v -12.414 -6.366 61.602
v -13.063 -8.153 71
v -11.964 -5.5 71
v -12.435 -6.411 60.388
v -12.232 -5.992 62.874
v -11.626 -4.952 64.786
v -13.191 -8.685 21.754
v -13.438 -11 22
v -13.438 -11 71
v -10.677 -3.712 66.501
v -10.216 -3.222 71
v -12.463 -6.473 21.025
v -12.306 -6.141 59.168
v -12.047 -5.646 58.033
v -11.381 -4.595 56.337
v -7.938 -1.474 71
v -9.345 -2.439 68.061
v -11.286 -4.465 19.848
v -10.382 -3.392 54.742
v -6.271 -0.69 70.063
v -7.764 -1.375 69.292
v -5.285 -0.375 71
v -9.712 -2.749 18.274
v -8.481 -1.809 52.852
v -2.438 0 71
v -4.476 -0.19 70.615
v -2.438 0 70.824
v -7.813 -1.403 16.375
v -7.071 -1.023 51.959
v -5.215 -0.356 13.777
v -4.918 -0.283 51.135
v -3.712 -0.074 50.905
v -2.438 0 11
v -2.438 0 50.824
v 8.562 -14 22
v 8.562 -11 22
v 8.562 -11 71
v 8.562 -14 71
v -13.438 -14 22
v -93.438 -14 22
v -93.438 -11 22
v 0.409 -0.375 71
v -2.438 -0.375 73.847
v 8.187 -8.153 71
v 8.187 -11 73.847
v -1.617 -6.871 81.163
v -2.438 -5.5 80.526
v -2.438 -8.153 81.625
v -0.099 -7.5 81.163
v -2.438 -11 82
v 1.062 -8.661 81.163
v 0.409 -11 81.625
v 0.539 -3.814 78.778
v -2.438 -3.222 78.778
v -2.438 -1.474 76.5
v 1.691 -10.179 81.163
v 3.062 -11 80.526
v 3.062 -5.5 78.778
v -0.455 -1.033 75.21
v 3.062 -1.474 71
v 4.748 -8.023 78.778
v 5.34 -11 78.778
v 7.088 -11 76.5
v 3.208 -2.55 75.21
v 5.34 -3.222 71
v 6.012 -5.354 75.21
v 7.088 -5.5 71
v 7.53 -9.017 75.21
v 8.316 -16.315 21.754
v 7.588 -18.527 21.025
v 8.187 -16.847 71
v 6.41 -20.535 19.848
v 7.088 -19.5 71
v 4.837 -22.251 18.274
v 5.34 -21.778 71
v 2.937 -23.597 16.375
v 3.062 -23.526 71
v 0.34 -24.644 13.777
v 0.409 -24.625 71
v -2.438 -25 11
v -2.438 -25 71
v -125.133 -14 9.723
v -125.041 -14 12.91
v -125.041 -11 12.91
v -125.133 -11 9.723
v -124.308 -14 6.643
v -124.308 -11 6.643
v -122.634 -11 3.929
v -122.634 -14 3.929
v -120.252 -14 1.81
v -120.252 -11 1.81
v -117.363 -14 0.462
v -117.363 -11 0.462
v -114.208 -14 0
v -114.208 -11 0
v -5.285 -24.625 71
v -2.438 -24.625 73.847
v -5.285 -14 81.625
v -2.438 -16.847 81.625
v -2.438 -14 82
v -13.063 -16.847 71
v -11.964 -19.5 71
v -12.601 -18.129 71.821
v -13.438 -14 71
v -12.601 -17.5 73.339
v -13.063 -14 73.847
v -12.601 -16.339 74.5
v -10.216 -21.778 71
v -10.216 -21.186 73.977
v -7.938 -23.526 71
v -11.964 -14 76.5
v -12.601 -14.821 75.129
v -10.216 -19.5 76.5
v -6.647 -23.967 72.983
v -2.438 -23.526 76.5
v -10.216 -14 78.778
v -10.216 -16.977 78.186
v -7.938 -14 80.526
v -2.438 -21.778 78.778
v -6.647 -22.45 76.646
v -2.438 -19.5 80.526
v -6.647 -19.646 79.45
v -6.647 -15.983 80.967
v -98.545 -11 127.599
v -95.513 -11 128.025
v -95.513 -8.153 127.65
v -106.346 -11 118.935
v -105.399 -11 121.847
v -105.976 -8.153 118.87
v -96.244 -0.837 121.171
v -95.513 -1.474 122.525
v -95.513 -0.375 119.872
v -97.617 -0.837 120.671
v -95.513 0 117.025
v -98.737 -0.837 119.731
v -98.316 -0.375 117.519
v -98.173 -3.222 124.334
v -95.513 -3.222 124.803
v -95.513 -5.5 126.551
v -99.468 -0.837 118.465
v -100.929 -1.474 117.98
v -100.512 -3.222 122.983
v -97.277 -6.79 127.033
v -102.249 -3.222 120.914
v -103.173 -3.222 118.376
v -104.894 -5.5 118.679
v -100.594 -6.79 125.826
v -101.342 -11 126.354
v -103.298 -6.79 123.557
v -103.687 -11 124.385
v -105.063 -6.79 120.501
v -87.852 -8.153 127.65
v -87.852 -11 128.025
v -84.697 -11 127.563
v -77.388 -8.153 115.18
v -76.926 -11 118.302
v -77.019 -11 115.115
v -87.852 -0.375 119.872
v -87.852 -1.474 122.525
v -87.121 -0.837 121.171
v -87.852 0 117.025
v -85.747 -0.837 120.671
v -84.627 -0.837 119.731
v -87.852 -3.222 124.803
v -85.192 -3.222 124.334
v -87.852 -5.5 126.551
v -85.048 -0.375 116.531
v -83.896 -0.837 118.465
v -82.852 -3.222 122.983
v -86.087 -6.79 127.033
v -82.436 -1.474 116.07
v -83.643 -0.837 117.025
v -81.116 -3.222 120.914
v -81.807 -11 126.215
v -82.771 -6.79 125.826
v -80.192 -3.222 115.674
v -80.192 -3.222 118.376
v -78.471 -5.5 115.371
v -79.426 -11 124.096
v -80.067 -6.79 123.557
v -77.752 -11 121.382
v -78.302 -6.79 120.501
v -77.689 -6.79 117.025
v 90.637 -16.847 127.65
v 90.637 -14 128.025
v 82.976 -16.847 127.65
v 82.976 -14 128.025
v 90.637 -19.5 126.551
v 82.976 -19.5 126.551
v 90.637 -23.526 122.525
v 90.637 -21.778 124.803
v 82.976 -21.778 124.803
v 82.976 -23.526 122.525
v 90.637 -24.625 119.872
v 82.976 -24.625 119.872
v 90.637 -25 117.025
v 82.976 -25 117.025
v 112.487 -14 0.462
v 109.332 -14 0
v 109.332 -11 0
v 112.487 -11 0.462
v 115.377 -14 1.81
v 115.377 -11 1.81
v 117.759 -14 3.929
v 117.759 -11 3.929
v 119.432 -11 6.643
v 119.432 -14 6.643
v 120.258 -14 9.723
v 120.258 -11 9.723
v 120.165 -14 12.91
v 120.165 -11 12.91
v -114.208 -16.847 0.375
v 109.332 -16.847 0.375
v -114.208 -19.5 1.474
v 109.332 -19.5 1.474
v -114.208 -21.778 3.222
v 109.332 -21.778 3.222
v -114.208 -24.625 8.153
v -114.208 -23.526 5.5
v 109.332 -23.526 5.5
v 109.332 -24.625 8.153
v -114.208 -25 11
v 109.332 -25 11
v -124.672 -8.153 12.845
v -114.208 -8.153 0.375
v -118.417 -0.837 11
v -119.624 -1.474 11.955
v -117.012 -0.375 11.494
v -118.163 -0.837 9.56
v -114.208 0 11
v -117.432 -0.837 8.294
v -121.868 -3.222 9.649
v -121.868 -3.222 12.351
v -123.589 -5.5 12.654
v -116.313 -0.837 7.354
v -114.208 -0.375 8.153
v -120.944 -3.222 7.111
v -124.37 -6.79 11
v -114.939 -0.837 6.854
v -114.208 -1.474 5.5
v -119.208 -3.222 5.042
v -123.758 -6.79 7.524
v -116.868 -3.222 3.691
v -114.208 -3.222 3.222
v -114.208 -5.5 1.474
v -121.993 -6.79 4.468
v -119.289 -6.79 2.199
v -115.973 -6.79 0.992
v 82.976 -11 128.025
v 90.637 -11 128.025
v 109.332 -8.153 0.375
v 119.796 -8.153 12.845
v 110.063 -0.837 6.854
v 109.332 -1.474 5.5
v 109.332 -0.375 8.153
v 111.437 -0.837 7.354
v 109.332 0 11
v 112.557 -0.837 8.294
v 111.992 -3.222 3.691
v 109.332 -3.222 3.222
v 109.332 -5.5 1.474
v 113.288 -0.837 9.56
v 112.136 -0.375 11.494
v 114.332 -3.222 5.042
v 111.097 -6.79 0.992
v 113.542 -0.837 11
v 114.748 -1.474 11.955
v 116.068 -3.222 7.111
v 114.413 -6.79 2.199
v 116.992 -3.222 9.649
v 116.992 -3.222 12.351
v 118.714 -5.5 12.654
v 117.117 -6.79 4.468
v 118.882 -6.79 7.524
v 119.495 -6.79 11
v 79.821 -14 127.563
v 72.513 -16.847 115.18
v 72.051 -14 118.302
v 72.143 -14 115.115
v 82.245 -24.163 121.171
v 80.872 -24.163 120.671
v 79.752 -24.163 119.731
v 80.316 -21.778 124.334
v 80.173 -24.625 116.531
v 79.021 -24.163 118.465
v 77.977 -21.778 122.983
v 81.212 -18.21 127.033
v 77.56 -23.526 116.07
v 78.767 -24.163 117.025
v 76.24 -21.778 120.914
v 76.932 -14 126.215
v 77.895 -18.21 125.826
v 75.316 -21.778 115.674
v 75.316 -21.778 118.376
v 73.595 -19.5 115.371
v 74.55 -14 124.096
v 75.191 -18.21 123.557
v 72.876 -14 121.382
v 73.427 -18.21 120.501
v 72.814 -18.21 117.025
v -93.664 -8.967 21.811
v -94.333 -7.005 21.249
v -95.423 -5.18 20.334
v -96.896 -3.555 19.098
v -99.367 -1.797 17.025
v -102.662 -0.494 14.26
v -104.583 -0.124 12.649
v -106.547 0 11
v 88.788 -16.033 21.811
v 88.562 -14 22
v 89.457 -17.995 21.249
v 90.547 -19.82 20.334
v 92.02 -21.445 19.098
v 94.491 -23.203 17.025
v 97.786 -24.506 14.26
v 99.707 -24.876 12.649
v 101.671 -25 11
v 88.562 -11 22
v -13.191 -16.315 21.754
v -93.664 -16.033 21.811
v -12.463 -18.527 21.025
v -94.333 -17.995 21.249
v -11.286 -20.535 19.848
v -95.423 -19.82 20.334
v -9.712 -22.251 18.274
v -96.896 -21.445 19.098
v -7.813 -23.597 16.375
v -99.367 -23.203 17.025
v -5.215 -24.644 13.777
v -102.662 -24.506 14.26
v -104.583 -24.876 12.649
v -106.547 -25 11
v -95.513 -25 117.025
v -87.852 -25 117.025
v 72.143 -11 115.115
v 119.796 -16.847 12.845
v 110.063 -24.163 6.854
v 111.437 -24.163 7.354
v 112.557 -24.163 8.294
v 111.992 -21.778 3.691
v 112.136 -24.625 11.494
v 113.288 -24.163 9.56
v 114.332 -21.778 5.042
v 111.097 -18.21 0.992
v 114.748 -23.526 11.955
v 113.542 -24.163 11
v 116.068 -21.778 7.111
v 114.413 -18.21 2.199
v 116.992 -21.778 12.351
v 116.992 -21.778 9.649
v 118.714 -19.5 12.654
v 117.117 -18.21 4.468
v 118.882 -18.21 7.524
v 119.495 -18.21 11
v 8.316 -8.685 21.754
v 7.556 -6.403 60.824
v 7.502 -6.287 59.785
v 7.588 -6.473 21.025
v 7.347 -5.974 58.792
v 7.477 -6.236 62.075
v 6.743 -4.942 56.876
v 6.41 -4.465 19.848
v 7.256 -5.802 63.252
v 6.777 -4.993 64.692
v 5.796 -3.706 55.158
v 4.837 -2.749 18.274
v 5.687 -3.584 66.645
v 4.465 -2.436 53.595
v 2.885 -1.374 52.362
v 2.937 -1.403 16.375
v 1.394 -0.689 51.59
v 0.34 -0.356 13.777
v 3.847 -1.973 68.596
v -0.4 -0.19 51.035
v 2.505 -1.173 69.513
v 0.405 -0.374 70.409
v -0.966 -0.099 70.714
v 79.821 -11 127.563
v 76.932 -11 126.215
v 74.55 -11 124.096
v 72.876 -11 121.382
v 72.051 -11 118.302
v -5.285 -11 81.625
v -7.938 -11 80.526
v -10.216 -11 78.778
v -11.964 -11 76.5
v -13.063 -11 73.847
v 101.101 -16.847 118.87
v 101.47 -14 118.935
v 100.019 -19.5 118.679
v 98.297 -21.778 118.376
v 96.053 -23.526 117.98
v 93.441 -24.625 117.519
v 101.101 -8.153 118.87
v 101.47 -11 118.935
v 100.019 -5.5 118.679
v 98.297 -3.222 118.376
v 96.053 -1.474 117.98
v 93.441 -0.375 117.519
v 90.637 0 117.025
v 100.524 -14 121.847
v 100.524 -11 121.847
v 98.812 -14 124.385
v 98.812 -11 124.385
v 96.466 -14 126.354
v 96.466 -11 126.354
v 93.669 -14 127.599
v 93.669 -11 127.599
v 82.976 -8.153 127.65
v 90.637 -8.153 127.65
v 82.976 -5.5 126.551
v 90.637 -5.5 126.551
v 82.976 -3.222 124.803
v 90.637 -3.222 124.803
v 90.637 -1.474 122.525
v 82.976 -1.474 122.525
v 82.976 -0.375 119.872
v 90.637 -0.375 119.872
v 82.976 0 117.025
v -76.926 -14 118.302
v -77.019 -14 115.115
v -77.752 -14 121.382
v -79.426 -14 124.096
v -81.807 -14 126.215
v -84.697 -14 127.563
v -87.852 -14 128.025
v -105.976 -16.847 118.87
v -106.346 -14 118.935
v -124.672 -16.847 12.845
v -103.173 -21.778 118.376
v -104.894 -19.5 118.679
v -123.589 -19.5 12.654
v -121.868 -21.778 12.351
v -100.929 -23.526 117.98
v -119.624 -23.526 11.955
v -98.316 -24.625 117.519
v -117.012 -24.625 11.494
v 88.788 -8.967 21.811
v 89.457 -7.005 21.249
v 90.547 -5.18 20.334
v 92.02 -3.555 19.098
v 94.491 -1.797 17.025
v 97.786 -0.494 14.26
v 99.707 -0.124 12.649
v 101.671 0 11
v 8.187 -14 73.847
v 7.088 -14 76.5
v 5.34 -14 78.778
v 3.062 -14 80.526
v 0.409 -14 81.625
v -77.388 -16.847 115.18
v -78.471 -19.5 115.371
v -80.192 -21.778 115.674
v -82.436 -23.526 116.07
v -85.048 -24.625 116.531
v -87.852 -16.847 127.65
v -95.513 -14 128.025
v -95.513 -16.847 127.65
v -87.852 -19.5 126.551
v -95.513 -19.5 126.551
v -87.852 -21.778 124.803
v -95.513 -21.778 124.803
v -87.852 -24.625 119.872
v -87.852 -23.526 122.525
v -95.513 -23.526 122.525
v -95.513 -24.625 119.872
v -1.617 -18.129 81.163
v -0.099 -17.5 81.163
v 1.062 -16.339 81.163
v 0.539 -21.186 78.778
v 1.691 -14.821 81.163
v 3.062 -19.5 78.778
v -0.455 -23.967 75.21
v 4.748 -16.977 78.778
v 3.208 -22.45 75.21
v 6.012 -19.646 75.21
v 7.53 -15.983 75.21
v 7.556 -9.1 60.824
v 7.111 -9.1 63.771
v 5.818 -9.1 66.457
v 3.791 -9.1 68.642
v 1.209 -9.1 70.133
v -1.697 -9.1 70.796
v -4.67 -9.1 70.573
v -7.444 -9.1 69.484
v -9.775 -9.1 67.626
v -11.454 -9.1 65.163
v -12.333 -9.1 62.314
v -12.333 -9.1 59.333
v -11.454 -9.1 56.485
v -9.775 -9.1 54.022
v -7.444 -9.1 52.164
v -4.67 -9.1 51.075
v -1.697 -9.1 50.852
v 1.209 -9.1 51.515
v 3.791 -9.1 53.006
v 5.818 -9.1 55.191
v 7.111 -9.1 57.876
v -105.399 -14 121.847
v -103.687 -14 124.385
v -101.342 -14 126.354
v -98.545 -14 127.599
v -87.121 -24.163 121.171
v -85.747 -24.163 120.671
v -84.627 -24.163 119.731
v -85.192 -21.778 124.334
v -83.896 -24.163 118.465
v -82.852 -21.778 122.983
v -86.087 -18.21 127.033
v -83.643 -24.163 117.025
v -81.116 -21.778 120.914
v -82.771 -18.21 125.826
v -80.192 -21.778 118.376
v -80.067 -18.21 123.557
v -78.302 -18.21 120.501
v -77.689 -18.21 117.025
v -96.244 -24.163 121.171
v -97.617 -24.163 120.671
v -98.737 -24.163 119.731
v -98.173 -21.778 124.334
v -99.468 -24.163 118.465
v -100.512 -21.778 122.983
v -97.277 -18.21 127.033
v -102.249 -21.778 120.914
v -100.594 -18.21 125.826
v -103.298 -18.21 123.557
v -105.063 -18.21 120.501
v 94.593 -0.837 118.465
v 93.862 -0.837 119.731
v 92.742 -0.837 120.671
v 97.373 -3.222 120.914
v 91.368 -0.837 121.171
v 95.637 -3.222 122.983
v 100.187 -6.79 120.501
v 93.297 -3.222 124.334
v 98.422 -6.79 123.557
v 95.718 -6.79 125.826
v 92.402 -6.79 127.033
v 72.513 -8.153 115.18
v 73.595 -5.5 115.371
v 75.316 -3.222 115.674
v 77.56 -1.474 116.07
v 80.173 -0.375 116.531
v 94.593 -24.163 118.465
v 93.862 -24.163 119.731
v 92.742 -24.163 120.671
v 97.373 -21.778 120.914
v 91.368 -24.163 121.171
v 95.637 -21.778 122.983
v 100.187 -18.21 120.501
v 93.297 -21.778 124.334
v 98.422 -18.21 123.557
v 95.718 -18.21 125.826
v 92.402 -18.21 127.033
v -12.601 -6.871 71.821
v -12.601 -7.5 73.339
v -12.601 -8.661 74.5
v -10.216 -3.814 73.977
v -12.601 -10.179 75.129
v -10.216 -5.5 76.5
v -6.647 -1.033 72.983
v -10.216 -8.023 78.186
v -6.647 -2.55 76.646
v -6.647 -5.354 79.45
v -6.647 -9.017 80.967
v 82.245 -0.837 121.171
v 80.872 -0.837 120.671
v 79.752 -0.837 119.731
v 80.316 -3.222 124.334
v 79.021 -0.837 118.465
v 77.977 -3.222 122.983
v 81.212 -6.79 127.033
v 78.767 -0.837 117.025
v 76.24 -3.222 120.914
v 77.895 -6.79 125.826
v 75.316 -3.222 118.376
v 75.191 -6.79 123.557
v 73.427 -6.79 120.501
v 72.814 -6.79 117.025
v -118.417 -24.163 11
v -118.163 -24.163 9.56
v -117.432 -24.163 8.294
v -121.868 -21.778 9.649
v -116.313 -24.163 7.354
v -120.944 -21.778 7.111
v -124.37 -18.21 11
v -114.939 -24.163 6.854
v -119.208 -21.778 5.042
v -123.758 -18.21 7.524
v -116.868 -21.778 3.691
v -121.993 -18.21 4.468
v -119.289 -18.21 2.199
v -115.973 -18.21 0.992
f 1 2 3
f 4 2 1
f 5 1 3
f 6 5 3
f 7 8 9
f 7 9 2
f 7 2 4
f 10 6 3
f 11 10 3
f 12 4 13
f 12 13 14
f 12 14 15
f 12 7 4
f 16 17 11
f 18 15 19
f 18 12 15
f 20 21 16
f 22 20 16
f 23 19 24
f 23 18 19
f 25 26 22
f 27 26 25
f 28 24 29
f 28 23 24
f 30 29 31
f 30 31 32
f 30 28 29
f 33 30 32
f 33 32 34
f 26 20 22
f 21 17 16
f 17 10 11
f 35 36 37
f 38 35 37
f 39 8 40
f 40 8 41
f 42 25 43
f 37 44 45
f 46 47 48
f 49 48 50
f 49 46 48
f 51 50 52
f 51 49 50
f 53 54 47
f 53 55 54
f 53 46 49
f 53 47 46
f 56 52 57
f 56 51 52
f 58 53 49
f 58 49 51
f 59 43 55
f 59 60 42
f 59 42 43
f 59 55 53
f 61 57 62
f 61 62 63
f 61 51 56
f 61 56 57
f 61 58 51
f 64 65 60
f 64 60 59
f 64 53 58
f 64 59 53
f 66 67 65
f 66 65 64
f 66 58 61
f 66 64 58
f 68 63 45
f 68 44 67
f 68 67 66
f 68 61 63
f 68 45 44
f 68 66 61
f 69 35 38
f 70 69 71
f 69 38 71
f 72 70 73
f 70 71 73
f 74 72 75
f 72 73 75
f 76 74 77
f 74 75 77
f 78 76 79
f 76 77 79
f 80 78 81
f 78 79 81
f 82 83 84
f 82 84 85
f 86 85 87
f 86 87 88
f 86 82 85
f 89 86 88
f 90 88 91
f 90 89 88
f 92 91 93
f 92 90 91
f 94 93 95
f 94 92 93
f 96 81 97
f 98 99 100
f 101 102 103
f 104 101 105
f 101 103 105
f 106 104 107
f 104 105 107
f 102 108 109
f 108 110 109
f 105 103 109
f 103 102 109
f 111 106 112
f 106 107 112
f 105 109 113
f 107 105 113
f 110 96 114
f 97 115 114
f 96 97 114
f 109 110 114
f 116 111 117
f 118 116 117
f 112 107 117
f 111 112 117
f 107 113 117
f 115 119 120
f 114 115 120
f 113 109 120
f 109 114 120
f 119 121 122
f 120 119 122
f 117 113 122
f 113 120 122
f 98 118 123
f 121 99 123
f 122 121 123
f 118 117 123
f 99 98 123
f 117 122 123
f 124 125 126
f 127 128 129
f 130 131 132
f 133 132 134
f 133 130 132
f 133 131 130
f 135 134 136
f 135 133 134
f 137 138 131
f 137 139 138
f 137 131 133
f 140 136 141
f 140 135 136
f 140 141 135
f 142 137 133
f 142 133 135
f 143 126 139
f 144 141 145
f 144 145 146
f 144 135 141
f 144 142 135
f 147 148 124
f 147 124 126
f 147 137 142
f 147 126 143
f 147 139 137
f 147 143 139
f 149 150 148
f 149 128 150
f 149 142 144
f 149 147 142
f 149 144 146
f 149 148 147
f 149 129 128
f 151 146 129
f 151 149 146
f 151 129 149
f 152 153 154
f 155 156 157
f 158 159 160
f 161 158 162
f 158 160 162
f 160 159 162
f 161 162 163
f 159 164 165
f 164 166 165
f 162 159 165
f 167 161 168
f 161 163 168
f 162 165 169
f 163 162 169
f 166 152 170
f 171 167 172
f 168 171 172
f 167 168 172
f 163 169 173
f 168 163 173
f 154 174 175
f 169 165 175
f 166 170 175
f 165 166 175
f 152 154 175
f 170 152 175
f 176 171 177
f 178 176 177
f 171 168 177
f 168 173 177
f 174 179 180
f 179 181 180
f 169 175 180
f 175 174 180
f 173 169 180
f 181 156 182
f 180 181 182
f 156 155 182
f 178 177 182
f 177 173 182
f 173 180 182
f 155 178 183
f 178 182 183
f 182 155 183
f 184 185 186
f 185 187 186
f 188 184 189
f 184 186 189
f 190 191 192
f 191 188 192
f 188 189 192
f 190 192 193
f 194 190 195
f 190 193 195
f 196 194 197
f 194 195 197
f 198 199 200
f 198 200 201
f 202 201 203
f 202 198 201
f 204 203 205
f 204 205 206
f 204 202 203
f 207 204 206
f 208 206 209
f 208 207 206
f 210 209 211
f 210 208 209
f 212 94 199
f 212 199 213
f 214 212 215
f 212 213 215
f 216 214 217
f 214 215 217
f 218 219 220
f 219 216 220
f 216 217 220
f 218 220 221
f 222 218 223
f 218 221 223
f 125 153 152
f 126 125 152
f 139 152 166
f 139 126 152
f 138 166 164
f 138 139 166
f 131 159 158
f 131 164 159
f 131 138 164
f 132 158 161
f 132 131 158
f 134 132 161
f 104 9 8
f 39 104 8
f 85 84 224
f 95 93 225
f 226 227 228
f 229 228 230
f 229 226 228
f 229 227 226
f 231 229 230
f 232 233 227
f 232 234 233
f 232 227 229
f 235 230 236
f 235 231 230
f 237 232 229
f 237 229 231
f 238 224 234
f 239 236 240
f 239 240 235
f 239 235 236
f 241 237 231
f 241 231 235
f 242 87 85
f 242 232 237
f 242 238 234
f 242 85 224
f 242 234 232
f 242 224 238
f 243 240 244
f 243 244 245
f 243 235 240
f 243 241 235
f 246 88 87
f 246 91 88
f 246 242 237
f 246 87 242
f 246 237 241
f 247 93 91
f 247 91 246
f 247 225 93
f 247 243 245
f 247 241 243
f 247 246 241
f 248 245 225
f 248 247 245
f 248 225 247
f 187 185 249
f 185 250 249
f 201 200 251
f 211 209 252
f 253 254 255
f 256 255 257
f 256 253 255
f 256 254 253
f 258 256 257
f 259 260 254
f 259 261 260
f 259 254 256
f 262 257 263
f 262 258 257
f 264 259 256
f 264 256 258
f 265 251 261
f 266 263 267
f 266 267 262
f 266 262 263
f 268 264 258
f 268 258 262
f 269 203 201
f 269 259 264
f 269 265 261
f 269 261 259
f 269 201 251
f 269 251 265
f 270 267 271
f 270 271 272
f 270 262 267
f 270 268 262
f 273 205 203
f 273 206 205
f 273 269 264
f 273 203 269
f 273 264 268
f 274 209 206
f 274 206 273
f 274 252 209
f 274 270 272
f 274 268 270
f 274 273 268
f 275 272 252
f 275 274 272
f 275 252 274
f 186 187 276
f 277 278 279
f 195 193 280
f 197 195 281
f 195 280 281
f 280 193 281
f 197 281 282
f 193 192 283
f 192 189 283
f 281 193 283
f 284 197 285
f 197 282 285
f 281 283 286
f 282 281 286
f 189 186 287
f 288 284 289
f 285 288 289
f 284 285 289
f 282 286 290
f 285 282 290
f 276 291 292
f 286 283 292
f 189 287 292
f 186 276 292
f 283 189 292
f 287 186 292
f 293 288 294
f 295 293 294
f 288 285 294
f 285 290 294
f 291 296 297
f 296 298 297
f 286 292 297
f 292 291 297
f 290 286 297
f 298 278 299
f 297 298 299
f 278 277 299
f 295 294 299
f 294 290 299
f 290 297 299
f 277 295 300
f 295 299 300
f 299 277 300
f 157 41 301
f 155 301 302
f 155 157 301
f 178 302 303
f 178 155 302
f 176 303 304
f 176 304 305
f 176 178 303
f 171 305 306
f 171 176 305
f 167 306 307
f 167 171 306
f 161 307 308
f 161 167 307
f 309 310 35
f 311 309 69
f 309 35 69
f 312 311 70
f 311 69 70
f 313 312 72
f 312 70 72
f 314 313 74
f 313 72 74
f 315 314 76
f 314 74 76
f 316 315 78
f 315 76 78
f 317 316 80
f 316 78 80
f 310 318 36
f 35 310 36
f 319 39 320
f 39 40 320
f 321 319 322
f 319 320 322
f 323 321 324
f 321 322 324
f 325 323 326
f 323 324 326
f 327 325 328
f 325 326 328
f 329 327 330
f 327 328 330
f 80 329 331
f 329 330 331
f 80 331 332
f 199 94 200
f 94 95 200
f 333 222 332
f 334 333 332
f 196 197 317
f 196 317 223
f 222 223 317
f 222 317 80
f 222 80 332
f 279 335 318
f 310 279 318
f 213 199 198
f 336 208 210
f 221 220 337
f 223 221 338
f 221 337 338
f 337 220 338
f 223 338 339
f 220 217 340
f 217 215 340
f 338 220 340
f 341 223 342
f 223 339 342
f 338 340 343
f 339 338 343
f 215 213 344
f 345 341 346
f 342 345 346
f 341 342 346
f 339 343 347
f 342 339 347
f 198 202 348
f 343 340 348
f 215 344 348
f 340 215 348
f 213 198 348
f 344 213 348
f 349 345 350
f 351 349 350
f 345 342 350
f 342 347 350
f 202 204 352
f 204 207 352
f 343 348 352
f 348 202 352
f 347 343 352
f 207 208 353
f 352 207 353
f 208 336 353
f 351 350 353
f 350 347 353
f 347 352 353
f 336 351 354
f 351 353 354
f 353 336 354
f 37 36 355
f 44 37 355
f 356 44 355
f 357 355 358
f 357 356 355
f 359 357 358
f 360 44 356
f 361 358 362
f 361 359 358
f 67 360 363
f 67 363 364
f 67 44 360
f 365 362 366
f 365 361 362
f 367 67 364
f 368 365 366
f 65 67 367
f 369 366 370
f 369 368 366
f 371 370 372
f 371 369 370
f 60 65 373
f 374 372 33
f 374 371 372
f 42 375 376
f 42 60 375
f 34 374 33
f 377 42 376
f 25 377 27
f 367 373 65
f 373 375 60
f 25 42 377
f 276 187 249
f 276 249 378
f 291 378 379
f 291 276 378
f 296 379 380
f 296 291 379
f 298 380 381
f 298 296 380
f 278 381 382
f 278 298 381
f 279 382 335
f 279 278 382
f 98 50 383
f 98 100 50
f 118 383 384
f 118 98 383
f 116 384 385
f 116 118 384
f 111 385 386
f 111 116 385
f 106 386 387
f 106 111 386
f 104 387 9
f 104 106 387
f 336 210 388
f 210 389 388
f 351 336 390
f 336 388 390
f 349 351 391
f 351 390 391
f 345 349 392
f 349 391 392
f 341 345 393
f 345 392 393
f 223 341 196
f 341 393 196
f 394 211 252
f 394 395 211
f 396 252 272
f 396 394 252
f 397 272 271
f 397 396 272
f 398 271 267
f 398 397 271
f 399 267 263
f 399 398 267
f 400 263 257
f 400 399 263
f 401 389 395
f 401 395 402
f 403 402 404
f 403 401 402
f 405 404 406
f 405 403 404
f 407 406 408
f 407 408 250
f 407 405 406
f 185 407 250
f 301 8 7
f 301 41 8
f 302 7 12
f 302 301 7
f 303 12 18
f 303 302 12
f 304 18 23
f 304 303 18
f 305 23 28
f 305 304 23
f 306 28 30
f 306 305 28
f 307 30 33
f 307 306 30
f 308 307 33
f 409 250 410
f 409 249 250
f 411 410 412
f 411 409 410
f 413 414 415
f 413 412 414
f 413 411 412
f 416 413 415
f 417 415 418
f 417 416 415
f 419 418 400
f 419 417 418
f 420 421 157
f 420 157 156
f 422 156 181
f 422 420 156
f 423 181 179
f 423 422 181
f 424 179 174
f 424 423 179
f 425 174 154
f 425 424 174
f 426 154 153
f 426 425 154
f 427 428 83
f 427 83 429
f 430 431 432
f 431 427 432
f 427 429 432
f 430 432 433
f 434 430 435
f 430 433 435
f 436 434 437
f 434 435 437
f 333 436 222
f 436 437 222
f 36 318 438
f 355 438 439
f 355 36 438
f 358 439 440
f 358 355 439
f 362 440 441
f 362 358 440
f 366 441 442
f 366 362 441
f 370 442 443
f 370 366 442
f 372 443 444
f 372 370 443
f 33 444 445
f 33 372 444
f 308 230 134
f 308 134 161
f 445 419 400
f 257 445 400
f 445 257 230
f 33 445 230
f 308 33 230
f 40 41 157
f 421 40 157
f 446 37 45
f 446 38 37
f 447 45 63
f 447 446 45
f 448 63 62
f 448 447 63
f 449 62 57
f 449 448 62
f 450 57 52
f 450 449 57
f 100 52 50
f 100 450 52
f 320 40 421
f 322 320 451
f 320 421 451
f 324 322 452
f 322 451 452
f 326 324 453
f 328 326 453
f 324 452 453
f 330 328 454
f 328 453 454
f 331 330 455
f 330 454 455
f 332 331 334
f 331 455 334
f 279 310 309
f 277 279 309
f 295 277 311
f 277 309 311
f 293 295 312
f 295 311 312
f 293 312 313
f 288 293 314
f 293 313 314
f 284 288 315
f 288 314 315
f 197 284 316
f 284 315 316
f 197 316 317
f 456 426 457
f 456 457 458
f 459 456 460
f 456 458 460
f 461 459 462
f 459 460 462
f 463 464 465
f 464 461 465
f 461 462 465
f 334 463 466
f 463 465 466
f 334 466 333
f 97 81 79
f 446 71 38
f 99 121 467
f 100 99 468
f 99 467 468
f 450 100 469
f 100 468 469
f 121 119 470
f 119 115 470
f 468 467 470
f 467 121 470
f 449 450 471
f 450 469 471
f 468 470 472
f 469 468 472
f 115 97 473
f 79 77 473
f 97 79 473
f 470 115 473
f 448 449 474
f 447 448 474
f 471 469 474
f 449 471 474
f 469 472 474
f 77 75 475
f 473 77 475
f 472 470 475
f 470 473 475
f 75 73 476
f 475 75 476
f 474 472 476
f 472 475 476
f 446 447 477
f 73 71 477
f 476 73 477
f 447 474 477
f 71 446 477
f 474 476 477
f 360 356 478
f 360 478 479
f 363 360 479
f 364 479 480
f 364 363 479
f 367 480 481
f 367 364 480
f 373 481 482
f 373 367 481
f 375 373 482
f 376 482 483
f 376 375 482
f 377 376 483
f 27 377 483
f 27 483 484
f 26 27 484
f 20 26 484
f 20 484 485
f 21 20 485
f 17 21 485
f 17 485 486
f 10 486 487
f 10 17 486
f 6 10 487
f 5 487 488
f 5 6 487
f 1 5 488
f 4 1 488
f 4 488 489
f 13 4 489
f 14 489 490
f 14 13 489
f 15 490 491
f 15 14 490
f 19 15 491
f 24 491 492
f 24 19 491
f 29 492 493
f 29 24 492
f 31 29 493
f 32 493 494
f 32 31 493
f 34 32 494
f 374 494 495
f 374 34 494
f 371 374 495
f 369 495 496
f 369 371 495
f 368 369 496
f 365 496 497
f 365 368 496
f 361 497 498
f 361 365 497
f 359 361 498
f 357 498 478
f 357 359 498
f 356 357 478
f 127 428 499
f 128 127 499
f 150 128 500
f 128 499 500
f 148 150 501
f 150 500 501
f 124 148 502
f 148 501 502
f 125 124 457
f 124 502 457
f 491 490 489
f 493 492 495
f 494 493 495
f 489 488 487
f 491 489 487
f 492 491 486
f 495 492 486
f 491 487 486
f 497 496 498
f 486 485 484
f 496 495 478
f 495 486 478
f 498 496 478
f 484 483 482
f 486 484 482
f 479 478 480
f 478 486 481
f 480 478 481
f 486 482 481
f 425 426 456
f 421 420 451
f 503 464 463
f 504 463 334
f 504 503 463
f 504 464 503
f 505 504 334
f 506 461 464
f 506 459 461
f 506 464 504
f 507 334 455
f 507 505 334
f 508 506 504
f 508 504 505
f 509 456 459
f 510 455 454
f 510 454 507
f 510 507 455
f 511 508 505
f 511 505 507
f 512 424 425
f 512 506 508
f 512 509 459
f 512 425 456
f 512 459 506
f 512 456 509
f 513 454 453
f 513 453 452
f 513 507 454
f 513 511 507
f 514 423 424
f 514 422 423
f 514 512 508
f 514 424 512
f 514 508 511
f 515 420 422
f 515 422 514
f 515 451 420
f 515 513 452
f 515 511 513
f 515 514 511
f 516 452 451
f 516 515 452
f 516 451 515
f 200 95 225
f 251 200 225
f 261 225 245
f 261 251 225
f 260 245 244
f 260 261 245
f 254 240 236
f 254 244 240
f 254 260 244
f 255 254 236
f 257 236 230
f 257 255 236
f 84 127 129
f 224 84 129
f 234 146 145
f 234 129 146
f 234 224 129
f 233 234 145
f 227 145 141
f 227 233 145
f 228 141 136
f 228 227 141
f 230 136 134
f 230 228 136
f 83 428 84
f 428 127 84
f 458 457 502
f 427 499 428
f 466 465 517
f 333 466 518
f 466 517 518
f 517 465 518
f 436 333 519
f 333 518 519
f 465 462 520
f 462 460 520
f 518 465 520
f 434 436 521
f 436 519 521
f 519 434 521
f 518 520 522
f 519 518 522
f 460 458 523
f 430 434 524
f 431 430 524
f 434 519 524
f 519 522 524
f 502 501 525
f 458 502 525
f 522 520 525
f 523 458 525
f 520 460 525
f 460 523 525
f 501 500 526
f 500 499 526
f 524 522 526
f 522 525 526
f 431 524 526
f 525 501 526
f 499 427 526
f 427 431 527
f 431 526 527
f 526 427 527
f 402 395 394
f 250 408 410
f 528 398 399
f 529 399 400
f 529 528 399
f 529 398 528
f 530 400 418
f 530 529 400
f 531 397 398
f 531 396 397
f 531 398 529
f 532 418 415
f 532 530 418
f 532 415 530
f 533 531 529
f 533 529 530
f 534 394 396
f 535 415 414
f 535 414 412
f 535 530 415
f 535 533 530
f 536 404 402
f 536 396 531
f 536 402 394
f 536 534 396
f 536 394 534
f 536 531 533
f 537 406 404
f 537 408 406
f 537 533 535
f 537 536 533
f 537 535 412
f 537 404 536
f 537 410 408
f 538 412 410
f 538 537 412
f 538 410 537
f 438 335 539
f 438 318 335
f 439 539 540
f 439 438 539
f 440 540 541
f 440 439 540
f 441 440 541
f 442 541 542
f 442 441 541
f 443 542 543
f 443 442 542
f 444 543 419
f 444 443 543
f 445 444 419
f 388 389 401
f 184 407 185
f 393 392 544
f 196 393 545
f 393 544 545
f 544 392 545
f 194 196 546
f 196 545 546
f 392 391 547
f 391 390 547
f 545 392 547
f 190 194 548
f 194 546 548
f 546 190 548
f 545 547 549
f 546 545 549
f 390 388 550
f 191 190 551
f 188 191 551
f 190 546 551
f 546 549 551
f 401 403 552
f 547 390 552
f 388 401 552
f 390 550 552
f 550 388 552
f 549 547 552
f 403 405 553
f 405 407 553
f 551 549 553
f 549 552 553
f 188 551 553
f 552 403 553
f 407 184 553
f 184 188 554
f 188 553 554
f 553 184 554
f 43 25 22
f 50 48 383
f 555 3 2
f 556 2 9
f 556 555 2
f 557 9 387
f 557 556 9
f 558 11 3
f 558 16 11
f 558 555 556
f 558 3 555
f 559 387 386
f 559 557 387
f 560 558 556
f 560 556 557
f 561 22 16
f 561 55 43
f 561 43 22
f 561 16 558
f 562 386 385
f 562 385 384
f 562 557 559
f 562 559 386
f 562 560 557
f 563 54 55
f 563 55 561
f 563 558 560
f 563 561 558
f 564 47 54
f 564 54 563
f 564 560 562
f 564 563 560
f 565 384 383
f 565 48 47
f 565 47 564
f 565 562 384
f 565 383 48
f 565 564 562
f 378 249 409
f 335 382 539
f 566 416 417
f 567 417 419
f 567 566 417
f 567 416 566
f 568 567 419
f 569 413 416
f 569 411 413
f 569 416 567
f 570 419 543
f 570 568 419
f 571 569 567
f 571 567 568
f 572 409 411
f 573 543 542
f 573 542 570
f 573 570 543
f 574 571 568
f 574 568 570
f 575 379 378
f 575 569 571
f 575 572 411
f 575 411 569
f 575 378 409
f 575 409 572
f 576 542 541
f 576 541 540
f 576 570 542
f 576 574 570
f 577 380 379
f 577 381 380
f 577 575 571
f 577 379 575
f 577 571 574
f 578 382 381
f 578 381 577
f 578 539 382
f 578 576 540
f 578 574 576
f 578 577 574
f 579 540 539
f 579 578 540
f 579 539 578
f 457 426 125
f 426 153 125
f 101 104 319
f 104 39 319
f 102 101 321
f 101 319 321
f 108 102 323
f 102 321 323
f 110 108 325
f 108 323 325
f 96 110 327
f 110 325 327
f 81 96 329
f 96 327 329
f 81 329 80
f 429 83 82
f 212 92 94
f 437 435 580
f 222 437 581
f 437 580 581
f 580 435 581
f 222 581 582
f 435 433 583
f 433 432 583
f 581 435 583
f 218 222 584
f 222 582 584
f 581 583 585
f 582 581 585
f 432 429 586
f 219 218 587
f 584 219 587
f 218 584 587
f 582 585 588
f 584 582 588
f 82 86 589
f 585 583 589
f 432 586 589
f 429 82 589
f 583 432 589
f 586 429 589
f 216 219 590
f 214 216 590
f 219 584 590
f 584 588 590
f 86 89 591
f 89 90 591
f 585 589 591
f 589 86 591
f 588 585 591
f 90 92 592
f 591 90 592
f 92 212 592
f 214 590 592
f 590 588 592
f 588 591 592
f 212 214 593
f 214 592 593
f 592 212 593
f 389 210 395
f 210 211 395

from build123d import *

# Parameters (mm, degrees)
F1_DEPTH = 25
F2_R     = 10.99999
F3_R     = 10
F4_DEPTH = 9.1


# Not quite as in the source:
# - a fillet or chamfer is up to 0.001 mm smaller than in the source, because OpenCascade refuses the exact size


with BuildPart() as f1:
    # F0 (on Front) → F1 (new body)
    with BuildSketch(Plane.XZ):
        Polygon((-104.7428149239, 128.0250078916), (-127.3170780206, 0), (122.4413091306, 0), (99.8670460339, 128.0250078916), (92.5590772594, 128.0250078916), (69.8670460339, 128.0250078916), (88.562115555, 22), (8.562115555, 22), (8.562115555, 82), (-13.437884445, 82), (-13.437884445, 22), (-93.437884445, 22), (-74.7428149239, 128.0250078916), (-93.565618156, 128.0250078916), align=None)
    extrude(amount=F1_DEPTH)

    # F2 (radius 11 in the source; OpenCascade refuses exactly that, so slightly less here)
    f2_edges = [f1.edges().sort_by_distance(p)[0] for p in [
        (-89.742815, -25, 128.025008),
        (-116.029946, -25, 64.012504),
        (-2.437884, -25, 0),
        (111.154178, -25, 64.012504),
        (84.867046, -25, 128.025008),
        (79.214581, -25, 75.012504),
        (48.562116, -25, 22),
        (8.562116, -25, 52),
        (-2.437884, -25, 82),
        (-13.437884, -25, 52),
        (-53.437884, -25, 22),
        (-84.09035, -25, 75.012504),
        (-89.742815, 0, 128.025008),
        (-116.029946, 0, 64.012504),
        (-2.437884, 0, 0),
        (111.154178, 0, 64.012504),
        (84.867046, 0, 128.025008),
        (79.214581, 0, 75.012504),
        (48.562116, 0, 22),
        (8.562116, 0, 52),
        (-2.437884, 0, 82),
        (-13.437884, 0, 52),
        (-53.437884, 0, 22),
        (-84.09035, 0, 75.012504),
        (-74.742815, -12.5, 128.025008),
        (-104.742815, -12.5, 128.025008),
        (8.562116, -12.5, 82),
        (-13.437884, -12.5, 82),
        (99.867046, -12.5, 128.025008),
        (69.867046, -12.5, 128.025008),
        (122.441309, -12.5, 0),
        (-127.317078, -12.5, 0),
    ]]
    fillet(f2_edges, radius=F2_R)

    # F3 (on Front) → F4 (cut)
    with BuildSketch(Plane.XZ):
        with Locations((-2.4443906732, 60.8239136636)):
            Circle(F3_R)
    extrude(amount=F4_DEPTH, mode=Mode.SUBTRACT)


solid = f1.part
